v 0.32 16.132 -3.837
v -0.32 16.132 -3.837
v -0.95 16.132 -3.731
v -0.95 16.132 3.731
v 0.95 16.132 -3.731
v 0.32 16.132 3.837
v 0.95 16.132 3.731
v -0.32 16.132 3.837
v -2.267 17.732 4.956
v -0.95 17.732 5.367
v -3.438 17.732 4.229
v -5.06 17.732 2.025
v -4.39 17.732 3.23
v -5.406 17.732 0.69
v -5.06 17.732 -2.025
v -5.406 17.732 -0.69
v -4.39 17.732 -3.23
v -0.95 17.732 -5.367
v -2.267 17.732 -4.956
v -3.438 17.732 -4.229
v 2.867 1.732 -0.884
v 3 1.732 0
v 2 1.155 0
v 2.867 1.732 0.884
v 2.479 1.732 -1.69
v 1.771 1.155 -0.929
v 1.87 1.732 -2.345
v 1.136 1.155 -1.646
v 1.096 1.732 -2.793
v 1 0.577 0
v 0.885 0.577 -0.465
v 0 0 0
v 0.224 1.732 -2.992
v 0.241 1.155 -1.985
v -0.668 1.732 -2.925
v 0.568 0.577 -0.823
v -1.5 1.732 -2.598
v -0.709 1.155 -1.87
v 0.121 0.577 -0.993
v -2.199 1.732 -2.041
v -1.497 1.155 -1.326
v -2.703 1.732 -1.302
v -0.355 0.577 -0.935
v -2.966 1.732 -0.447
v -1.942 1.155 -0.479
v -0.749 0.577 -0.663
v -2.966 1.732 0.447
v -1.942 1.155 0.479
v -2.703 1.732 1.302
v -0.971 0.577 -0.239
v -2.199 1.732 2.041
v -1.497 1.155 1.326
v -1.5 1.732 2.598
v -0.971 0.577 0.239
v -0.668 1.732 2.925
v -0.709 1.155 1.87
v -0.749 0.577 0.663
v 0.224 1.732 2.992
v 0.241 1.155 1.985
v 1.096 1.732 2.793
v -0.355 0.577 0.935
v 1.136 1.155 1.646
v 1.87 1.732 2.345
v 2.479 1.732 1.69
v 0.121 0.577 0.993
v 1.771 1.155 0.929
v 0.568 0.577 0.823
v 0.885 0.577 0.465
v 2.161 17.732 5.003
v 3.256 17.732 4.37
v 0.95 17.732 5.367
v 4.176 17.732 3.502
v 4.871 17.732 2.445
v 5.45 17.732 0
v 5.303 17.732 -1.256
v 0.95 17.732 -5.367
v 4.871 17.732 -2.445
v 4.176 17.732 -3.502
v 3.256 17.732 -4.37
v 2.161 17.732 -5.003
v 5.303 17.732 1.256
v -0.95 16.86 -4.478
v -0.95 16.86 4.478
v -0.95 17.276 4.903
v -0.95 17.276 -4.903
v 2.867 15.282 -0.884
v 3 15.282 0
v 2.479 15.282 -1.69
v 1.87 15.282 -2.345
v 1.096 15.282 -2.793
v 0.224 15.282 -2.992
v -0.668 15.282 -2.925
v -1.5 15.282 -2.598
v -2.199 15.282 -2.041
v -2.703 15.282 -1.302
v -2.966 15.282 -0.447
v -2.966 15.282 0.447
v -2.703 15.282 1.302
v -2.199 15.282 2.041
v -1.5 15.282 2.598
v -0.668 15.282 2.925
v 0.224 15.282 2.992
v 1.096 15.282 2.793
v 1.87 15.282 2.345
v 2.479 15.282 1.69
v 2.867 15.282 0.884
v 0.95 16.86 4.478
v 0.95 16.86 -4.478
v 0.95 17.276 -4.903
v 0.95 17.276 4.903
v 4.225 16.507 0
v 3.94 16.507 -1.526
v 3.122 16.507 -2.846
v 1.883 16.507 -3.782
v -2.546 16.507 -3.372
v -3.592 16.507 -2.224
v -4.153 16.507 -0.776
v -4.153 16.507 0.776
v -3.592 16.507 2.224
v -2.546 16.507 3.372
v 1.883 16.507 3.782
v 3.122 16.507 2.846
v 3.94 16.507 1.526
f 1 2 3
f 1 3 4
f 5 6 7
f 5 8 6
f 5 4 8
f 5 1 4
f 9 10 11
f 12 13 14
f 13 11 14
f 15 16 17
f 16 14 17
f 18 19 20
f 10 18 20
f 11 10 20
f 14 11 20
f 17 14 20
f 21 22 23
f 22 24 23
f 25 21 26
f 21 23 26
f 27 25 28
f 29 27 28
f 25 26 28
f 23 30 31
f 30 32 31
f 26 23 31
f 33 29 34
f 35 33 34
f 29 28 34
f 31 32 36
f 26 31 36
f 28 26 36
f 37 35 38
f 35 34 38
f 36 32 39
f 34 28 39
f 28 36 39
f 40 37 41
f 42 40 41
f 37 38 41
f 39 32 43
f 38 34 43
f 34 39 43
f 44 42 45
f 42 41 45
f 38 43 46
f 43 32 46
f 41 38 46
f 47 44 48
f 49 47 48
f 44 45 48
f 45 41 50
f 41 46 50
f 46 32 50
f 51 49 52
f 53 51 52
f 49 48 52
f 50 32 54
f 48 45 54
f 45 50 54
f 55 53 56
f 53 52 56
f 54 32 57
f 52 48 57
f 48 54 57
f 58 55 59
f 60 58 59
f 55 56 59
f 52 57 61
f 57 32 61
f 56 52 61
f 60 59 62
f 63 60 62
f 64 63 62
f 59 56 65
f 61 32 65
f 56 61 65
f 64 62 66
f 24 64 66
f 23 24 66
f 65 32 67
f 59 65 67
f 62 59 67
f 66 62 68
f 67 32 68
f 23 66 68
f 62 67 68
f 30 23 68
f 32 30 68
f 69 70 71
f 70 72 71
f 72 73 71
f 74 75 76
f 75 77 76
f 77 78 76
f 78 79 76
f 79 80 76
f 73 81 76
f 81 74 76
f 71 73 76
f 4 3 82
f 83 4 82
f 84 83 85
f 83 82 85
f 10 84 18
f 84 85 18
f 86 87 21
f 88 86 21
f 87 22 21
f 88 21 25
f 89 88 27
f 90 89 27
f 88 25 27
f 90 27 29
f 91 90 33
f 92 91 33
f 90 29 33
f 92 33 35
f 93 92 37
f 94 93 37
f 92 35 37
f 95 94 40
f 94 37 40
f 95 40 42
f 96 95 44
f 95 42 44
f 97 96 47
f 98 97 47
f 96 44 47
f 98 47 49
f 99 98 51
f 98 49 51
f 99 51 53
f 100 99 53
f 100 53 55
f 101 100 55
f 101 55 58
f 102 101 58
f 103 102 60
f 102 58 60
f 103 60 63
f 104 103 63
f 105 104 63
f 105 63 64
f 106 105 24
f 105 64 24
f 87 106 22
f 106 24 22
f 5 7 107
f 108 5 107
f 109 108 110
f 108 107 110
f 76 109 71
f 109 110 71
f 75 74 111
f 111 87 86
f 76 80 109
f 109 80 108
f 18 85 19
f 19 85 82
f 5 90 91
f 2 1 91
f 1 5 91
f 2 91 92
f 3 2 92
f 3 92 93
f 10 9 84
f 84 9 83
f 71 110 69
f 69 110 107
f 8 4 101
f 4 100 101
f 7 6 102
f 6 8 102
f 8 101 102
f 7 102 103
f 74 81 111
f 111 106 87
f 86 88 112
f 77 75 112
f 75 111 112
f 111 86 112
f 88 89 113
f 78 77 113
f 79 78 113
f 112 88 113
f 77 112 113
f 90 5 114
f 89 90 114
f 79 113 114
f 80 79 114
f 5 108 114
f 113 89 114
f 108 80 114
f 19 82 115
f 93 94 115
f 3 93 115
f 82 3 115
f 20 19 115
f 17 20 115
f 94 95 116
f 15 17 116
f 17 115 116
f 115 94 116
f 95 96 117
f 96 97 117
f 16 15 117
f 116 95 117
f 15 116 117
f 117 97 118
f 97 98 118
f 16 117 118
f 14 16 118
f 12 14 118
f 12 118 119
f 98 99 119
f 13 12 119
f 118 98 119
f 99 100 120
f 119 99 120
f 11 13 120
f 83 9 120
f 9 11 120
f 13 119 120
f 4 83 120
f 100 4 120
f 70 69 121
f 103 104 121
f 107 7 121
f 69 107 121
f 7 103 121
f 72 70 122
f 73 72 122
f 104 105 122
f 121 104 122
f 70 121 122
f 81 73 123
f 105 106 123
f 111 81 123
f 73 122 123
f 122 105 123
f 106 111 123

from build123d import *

# Parameters (mm, degrees)
SKETCH2_W               = 1.9
SKETCH2_H               = 1.6
CUT_EXTRUDE1_DEPTH      = 6.45
CUT_EXTRUDE1_DEPTH_BACK = 6.45


with BuildPart() as part:
    # Sketch1 → Revolve1 (revolve)
    with BuildSketch(Plane.XY):
        Polygon((0, 0), (0, 17.732050808), (5.45, 17.732050808), (3, 15.282050808), (3, 1.732050808), align=None)
    revolve(axis=Axis((0, 0, 0), (0, 1, 0)))

    # Sketch2 → Cut-Extrude1 (cut, two sides)
    with BuildSketch(Plane.XY) as cut_extrude1_sk:
        with Locations((0, 16.932050808)):
            Rectangle(SKETCH2_W, SKETCH2_H)
    extrude(amount=CUT_EXTRUDE1_DEPTH, mode=Mode.SUBTRACT)
    extrude(cut_extrude1_sk.sketch, amount=-CUT_EXTRUDE1_DEPTH_BACK, mode=Mode.SUBTRACT)


solid = part.part
